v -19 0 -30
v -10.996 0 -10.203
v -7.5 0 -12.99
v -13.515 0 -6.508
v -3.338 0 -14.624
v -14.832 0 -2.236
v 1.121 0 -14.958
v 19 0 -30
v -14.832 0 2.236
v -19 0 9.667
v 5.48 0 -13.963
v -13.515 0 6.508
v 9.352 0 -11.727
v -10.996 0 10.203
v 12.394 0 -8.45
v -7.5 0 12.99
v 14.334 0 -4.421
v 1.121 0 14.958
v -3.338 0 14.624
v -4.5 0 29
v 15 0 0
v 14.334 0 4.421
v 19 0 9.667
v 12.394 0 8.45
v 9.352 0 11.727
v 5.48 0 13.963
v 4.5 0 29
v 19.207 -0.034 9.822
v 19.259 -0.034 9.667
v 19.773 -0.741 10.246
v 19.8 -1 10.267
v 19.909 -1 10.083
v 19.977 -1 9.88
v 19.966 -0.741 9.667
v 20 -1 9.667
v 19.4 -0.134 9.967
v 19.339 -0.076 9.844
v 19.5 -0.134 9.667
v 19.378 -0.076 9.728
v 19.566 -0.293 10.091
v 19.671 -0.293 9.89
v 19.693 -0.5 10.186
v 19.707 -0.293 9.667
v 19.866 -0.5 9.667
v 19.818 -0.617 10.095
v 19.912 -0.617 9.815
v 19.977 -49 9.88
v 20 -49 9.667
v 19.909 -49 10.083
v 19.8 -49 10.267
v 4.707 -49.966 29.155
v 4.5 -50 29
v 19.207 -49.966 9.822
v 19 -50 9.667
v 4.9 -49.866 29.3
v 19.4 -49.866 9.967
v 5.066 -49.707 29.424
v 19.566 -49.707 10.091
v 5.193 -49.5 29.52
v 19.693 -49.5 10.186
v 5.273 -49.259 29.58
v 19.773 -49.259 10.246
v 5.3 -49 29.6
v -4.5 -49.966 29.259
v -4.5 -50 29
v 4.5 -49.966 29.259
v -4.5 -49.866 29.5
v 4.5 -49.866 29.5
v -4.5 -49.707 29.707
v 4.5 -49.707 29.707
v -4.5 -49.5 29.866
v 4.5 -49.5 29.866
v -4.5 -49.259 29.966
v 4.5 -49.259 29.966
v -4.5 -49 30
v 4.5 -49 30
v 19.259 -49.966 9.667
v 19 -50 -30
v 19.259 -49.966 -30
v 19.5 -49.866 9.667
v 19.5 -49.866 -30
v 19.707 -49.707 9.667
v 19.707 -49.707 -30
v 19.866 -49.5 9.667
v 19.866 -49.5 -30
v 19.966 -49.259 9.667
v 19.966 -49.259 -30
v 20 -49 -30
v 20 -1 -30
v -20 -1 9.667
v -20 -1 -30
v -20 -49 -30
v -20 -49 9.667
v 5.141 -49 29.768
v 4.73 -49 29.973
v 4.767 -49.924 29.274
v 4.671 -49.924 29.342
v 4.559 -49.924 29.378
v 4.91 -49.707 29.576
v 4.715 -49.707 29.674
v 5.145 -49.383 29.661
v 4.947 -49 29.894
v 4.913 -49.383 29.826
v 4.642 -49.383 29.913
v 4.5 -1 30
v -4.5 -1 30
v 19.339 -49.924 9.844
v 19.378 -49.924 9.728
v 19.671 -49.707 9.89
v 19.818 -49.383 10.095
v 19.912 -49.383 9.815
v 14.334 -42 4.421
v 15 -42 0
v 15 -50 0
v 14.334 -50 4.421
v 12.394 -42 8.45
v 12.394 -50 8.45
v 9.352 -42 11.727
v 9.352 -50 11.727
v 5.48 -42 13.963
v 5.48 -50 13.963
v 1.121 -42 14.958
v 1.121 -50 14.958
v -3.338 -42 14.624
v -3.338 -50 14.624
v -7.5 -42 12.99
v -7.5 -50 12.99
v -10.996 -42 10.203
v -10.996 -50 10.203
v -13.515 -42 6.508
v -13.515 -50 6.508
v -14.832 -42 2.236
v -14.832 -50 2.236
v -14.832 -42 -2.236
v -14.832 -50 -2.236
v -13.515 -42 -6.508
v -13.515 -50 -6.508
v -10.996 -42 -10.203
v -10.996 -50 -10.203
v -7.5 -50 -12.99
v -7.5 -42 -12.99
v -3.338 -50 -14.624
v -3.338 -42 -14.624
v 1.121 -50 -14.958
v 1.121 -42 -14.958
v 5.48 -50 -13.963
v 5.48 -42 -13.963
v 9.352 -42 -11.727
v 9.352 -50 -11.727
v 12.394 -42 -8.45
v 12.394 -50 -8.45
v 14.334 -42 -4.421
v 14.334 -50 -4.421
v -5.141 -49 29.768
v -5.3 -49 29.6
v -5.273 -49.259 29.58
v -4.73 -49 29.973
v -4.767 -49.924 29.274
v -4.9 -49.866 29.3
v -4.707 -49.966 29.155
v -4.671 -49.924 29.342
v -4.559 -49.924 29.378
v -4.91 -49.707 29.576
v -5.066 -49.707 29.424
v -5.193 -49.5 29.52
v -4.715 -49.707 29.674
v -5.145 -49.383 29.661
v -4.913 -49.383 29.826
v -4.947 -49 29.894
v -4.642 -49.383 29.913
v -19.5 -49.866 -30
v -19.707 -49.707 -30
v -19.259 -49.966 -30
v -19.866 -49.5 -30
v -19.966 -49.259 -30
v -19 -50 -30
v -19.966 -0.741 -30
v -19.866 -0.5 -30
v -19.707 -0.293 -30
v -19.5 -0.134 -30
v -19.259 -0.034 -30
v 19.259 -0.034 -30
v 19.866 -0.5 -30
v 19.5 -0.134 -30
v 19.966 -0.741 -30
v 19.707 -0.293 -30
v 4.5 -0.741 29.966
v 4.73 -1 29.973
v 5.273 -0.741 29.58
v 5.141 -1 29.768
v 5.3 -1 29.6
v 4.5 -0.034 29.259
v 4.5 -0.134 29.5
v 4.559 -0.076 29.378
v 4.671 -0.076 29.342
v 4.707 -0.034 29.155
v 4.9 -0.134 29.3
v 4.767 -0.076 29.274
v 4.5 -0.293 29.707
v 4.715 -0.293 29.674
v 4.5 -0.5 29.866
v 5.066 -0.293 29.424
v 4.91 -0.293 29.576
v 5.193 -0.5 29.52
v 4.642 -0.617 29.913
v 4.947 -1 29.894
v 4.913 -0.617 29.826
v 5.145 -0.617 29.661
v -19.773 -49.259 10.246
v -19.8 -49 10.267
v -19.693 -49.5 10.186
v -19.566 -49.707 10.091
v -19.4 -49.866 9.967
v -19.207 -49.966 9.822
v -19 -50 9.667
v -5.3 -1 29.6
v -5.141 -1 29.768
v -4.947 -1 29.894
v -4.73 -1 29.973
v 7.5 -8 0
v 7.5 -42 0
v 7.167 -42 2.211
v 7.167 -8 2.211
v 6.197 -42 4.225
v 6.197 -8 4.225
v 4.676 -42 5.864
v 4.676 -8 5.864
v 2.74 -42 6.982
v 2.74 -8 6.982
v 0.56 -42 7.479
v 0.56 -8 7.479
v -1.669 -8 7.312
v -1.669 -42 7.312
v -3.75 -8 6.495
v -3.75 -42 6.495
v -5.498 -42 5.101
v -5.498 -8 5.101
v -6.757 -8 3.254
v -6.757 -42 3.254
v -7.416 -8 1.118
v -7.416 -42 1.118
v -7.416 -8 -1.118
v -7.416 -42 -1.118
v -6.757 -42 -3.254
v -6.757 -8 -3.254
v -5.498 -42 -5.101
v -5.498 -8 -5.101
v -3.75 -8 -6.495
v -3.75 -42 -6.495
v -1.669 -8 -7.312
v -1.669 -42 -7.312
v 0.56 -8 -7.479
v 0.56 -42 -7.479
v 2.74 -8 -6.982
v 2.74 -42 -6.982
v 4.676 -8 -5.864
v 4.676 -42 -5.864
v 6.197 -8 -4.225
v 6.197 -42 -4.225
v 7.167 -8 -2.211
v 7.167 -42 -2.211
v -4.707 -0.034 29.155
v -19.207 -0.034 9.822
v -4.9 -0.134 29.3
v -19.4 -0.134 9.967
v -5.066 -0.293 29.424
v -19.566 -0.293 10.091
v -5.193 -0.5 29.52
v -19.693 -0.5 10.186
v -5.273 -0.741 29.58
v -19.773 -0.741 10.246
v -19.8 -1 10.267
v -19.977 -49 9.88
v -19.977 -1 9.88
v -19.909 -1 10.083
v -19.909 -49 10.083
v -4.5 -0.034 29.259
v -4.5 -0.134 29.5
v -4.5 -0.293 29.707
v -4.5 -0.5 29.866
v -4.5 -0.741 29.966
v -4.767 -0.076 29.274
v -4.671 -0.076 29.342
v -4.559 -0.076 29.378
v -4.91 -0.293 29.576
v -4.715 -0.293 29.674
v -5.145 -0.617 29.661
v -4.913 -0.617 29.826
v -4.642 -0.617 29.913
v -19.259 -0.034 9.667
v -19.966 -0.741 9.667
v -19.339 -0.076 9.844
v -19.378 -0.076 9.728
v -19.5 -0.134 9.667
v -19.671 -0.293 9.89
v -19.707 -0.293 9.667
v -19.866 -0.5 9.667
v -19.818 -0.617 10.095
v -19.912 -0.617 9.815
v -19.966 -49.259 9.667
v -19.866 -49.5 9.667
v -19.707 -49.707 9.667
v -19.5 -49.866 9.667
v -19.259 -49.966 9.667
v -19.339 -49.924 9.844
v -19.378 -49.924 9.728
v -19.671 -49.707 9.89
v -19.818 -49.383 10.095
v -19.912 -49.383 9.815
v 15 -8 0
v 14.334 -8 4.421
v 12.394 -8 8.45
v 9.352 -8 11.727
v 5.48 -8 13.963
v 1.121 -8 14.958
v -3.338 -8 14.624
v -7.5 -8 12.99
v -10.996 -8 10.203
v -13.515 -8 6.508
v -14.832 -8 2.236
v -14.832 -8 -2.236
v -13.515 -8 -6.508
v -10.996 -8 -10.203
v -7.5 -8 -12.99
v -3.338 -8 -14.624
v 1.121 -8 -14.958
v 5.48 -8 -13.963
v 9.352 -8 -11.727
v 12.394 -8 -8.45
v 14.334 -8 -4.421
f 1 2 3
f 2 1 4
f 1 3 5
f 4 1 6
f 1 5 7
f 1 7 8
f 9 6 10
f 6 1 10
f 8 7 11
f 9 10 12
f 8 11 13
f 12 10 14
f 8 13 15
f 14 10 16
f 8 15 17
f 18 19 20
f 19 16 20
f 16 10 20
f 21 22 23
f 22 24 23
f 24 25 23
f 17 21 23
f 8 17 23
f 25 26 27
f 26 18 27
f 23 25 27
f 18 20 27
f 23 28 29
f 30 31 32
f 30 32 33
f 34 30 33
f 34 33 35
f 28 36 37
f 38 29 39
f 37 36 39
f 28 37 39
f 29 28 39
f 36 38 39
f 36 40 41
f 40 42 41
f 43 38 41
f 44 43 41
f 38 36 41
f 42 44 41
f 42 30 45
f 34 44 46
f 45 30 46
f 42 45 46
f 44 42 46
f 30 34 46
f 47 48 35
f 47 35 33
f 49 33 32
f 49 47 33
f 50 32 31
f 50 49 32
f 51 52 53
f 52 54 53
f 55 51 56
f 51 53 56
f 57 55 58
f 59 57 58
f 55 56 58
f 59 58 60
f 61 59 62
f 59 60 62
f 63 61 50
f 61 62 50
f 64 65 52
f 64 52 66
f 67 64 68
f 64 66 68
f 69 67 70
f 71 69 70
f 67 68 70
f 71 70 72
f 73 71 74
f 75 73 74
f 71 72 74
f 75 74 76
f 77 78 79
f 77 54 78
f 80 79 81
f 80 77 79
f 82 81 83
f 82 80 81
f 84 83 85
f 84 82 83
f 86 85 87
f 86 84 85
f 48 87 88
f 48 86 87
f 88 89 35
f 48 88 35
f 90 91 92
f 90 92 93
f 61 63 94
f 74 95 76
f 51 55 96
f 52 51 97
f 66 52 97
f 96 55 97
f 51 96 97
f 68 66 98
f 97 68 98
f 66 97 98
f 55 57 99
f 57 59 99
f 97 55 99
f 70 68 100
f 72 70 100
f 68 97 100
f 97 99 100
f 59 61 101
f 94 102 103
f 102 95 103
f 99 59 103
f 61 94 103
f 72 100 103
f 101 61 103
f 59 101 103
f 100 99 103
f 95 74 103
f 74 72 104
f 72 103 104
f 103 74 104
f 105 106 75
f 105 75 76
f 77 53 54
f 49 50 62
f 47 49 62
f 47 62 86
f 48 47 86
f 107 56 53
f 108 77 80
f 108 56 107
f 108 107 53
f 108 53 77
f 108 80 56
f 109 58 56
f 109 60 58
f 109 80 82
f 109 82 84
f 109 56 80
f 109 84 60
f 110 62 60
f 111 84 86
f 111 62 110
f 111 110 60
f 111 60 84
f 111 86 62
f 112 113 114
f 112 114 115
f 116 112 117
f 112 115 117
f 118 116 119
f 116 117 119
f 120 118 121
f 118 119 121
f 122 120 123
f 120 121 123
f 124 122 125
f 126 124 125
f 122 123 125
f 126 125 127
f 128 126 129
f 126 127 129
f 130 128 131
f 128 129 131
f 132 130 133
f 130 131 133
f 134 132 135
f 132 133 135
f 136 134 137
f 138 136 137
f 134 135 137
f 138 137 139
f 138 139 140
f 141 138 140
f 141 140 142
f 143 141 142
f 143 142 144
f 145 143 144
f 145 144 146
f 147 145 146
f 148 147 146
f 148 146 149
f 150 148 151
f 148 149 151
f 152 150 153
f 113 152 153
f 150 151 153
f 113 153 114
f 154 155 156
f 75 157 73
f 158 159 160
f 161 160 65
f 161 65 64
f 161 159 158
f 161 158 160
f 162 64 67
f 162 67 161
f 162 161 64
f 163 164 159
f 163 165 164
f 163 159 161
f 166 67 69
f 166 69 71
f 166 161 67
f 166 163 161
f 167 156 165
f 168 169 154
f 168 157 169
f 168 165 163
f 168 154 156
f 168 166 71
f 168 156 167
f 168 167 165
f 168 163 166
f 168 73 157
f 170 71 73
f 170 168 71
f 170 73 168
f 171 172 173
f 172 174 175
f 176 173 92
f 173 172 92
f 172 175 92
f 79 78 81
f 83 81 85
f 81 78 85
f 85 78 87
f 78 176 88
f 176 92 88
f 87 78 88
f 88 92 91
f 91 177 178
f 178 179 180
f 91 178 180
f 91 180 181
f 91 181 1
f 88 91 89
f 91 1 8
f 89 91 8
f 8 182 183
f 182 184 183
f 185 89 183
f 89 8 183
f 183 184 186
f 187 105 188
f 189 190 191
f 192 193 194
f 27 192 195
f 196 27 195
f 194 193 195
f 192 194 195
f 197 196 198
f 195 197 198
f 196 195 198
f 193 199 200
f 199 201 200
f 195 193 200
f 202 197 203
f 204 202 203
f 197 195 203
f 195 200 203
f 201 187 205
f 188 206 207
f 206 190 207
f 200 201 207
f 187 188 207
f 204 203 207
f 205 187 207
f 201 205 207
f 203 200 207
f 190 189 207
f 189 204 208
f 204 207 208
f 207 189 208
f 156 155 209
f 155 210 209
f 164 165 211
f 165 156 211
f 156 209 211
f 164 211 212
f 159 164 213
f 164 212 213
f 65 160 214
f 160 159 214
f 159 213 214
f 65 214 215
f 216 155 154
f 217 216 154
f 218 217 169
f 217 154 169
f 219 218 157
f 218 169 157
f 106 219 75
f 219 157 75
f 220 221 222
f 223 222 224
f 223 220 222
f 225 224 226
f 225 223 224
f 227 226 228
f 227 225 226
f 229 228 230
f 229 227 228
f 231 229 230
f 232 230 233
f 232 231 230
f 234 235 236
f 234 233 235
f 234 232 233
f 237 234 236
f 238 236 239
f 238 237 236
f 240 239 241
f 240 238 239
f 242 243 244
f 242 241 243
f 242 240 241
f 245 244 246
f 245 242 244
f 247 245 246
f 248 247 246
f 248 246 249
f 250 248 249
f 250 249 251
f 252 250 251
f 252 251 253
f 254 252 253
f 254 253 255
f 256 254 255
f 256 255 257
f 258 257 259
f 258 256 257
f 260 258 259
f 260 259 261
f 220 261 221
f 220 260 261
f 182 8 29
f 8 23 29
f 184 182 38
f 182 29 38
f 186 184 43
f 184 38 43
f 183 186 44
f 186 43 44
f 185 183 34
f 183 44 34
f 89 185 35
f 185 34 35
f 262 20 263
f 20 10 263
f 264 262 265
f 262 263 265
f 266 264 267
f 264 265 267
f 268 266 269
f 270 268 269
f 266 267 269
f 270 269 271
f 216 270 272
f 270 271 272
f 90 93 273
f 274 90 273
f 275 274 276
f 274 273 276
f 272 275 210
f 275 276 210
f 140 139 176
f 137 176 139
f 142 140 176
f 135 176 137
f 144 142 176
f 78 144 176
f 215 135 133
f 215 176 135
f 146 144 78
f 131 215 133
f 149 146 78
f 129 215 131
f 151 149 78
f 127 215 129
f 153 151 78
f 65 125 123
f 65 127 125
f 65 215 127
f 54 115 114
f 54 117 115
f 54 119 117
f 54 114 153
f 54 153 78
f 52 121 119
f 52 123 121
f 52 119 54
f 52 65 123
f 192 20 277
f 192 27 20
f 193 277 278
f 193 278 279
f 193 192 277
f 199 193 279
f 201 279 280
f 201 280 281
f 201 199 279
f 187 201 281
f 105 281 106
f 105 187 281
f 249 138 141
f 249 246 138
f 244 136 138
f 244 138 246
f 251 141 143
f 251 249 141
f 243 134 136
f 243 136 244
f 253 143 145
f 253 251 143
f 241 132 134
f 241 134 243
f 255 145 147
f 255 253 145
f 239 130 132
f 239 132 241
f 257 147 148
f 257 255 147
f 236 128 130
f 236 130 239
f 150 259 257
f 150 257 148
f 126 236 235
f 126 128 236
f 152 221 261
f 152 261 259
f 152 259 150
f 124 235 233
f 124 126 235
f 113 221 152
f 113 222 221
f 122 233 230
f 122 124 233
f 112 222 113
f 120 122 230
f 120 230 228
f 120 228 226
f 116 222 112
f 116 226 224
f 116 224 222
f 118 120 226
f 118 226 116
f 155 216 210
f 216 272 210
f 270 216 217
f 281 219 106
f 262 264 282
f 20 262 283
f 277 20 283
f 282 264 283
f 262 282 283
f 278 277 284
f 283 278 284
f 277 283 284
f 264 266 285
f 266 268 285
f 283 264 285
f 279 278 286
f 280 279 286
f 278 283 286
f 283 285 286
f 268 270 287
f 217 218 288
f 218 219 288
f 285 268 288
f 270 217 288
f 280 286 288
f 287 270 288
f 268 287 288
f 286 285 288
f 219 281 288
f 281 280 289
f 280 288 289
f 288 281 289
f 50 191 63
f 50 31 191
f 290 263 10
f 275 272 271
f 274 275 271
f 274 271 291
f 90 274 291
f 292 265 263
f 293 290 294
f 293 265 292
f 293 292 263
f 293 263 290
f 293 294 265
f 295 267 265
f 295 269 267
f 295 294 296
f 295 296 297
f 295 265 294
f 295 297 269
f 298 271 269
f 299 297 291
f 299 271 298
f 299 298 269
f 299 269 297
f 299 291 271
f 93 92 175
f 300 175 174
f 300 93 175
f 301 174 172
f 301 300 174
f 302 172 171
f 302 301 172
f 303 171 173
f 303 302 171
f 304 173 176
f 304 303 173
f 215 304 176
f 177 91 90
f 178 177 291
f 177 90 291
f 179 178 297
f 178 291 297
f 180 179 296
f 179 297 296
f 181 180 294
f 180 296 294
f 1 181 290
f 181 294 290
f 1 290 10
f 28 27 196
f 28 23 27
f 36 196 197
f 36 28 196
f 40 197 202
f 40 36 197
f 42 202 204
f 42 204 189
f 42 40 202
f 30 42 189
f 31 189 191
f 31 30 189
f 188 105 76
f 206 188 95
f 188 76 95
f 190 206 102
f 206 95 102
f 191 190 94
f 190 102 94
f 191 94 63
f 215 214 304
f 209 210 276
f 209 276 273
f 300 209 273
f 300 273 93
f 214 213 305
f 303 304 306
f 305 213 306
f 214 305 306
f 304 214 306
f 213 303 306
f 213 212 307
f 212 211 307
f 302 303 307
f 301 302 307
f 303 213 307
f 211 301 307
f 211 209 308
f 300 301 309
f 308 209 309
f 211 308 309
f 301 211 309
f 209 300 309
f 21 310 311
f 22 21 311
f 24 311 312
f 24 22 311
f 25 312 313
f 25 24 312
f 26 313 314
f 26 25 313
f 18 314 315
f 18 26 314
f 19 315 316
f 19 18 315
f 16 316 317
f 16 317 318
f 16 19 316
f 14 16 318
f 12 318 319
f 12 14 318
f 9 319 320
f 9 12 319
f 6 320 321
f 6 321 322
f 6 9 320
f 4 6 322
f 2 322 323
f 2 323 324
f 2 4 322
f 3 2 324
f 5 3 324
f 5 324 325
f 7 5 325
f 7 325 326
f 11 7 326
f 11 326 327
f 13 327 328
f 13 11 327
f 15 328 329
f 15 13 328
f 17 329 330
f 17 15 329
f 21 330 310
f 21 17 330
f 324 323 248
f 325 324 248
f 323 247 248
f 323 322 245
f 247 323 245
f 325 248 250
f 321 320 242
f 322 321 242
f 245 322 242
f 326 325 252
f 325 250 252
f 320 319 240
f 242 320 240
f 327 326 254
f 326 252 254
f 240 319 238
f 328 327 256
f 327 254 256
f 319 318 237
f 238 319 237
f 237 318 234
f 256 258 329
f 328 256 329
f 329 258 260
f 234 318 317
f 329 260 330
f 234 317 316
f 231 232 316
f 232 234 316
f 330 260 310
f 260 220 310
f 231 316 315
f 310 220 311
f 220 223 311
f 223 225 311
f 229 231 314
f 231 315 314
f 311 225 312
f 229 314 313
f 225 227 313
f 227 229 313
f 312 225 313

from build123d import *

# Parameters (mm, degrees)
F0_W     = 40
F0_H     = 60
F0_R     = 15
F0_R_2   = 7.5
F1_DEPTH = 50
F2_DEPTH = 8
F3_R     = 15
F4_DEPTH = 8
F5_SIZE2 = 20
F5_SIZE  = 15
F6_R     = 1


with BuildPart() as f1:
    # F0 (on Front) → F1 (new body)
    with BuildSketch(Plane.XZ):
        Rectangle(F0_W, F0_H)
        Circle(F0_R, mode=Mode.SUBTRACT)
        Circle(F0_R)
        Circle(F0_R_2, mode=Mode.SUBTRACT)
    extrude(amount=F1_DEPTH)

    # F0 (on Front) → F2 (cut)
    with BuildSketch(Plane.XZ):
        Circle(F0_R)
        Circle(F0_R_2, mode=Mode.SUBTRACT)
    extrude(amount=F2_DEPTH, mode=Mode.SUBTRACT)

    # F3 (on face) → F4 (cut)
    with BuildSketch(Plane.XZ.offset(50)):
        Circle(F3_R)
    extrude(amount=-F4_DEPTH, mode=Mode.SUBTRACT)

    # F5
    f5_edges = [f1.edges().sort_by_distance(p)[0] for p in [
        (20, -25, 30),
        (-20, -25, 30),
    ]]
    f5_side = f1.faces().sort_by_distance((0, -25, 30))[0]
    chamfer(f5_edges, length=F5_SIZE, length2=F5_SIZE2, reference=f5_side)

    # F6
    f6_edges = [f1.edges().sort_by_distance(p)[0] for p in [
        (-5, -25, 30),
        (5, -25, 30),
        (20, -25, 10),
        (-12.5, 0, 20),
        (0, 0, 30),
        (12.5, 0, 20),
        (12.5, -50, 20),
        (-12.5, -50, 20),
        (0, -50, 30),
        (-20, -50, -10),
        (20, -50, -10),
        (20, 0, -10),
        (-20, 0, -10),
        (-20, -25, 10),
    ]]
    fillet(f6_edges, radius=F6_R)


solid = f1.part
